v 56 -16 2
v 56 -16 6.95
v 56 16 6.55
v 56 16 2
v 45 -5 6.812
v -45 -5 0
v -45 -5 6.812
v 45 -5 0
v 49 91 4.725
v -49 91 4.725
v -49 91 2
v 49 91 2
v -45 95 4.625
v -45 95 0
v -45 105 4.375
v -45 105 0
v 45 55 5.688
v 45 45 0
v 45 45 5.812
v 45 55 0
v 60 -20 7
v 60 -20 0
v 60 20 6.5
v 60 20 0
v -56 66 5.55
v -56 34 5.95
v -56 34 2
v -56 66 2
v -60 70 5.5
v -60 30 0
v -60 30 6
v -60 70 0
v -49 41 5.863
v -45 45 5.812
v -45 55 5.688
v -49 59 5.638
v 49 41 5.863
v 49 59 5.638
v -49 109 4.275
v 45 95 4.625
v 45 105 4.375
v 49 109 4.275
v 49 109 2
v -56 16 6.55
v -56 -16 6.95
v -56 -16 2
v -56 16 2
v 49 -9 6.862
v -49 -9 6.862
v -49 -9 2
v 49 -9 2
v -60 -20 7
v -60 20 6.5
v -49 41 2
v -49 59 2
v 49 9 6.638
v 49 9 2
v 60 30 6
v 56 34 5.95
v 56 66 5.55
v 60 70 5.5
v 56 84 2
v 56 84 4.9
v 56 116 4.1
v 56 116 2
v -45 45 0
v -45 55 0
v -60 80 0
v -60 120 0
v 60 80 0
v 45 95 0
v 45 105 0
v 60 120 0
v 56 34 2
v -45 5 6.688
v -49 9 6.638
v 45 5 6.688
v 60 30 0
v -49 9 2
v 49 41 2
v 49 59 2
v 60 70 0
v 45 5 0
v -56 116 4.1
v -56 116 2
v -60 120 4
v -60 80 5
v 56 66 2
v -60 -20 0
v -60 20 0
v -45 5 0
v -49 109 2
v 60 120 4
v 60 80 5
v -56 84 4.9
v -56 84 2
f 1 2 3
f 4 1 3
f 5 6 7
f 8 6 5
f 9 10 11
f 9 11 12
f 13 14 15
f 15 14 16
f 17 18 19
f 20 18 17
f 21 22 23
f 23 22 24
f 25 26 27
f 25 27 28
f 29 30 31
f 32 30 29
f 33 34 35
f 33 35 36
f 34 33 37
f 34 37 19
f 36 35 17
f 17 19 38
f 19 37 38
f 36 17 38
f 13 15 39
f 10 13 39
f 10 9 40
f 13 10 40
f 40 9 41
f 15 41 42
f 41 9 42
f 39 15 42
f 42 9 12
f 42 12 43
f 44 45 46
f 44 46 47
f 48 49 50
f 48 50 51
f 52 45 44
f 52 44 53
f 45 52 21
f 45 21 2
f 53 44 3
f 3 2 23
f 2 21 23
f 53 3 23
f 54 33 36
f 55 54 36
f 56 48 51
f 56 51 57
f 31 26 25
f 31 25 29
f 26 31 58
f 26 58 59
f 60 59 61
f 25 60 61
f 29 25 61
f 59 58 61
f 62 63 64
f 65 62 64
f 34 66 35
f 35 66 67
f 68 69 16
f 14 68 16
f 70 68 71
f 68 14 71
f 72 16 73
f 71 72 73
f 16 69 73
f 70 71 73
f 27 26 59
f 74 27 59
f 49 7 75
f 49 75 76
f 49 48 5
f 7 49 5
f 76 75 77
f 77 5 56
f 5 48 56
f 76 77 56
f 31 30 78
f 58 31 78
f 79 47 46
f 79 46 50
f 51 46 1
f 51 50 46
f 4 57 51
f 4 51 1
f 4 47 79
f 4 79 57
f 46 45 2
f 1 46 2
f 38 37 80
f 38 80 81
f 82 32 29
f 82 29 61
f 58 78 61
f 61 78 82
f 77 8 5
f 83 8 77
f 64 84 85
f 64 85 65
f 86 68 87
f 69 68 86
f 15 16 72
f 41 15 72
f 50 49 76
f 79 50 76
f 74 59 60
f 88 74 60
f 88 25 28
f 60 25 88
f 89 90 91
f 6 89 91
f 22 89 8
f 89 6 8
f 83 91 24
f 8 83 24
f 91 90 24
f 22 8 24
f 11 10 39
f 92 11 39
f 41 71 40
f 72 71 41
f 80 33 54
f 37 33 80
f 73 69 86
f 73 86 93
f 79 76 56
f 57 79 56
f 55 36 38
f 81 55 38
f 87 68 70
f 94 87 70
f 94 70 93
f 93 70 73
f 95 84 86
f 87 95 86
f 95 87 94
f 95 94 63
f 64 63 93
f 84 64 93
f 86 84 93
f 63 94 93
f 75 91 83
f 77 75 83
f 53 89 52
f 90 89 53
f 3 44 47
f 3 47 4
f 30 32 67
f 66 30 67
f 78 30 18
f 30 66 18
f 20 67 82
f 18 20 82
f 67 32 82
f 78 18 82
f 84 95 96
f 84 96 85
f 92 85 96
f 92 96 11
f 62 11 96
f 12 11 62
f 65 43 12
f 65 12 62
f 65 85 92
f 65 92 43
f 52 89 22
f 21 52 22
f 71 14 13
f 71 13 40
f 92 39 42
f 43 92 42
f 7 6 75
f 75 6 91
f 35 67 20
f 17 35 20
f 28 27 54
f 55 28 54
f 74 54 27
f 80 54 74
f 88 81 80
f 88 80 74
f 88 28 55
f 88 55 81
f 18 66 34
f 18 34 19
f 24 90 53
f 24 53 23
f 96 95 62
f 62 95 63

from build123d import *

# Parameters (mm, degrees)
F0_W      = 120
F0_H      = 40
F0_W_2    = 90
F0_H_2    = 10
F1_DEPTH  = 7
F2_W      = 112
F2_H      = 32
F2_W_2    = 98
F2_H_2    = 18
F3_DEPTH  = 5
F4_W      = 112
F4_H      = 32
F4_W_2    = 98
F4_H_2    = 18
F5_DEPTH  = 5
F6_W      = 112
F6_H      = 32
F6_W_2    = 98
F6_H_2    = 18
F7_DEPTH  = 5
F9_DEPTH  = 120.001
F11_DEPTH = 120.001
F13_DEPTH = 120.001


with BuildPart() as f1:
    # F0 (on Top) → F1 (new body)
    with BuildSketch(Plane.XY):
        Rectangle(F0_W, F0_H)
        Rectangle(F0_W_2, F0_H_2, mode=Mode.SUBTRACT)
        with Locations((0, 50)):
            Rectangle(F0_W, F0_H)
        with Locations((0, 50)):
            Rectangle(F0_W_2, F0_H_2, mode=Mode.SUBTRACT)
        with Locations((0, 100)):
            Rectangle(F0_W, F0_H)
        with Locations((0, 100)):
            Rectangle(F0_W_2, F0_H_2, mode=Mode.SUBTRACT)
    extrude(amount=F1_DEPTH)

    # F2 (on face) → F3 (cut)
    with BuildSketch(Plane.XY.offset(7)):
        Rectangle(F2_W, F2_H)
        Rectangle(F2_W_2, F2_H_2, mode=Mode.SUBTRACT)
    extrude(amount=-F3_DEPTH, mode=Mode.SUBTRACT)

    # F4 (on face) → F5 (cut)
    with BuildSketch(Plane.XY.offset(7)):
        with Locations((0, 50)):
            Rectangle(F4_W, F4_H)
        with Locations((0, 50)):
            Rectangle(F4_W_2, F4_H_2, mode=Mode.SUBTRACT)
    extrude(amount=-F5_DEPTH, mode=Mode.SUBTRACT)

    # F6 (on face) → F7 (cut)
    with BuildSketch(Plane.XY.offset(7)):
        with Locations((0, 100)):
            Rectangle(F6_W, F6_H)
        with Locations((0, 100)):
            Rectangle(F6_W_2, F6_H_2, mode=Mode.SUBTRACT)
    extrude(amount=-F7_DEPTH, mode=Mode.SUBTRACT)

    # F8 (on face) → F9 (cut, through all)
    with BuildSketch(Plane.YZ.offset(60)):
        Polygon((20, 7), (-20, 7), (20, 6.5), align=None)
    extrude(amount=-F9_DEPTH, mode=Mode.SUBTRACT)

    # F10 (on face) → F11 (cut, through all)
    with BuildSketch(Plane.YZ.offset(60)):
        Polygon((30, 7), (30, 6), (70, 5.5), (70, 7), align=None)
    extrude(amount=-F11_DEPTH, mode=Mode.SUBTRACT)

    # F12 (on face) → F13 (cut, through all)
    with BuildSketch(Plane.YZ.offset(60)):
        Polygon((80, 7), (80, 5), (120, 4), (120, 7), align=None)
    extrude(amount=-F13_DEPTH, mode=Mode.SUBTRACT)


solid = f1.part
